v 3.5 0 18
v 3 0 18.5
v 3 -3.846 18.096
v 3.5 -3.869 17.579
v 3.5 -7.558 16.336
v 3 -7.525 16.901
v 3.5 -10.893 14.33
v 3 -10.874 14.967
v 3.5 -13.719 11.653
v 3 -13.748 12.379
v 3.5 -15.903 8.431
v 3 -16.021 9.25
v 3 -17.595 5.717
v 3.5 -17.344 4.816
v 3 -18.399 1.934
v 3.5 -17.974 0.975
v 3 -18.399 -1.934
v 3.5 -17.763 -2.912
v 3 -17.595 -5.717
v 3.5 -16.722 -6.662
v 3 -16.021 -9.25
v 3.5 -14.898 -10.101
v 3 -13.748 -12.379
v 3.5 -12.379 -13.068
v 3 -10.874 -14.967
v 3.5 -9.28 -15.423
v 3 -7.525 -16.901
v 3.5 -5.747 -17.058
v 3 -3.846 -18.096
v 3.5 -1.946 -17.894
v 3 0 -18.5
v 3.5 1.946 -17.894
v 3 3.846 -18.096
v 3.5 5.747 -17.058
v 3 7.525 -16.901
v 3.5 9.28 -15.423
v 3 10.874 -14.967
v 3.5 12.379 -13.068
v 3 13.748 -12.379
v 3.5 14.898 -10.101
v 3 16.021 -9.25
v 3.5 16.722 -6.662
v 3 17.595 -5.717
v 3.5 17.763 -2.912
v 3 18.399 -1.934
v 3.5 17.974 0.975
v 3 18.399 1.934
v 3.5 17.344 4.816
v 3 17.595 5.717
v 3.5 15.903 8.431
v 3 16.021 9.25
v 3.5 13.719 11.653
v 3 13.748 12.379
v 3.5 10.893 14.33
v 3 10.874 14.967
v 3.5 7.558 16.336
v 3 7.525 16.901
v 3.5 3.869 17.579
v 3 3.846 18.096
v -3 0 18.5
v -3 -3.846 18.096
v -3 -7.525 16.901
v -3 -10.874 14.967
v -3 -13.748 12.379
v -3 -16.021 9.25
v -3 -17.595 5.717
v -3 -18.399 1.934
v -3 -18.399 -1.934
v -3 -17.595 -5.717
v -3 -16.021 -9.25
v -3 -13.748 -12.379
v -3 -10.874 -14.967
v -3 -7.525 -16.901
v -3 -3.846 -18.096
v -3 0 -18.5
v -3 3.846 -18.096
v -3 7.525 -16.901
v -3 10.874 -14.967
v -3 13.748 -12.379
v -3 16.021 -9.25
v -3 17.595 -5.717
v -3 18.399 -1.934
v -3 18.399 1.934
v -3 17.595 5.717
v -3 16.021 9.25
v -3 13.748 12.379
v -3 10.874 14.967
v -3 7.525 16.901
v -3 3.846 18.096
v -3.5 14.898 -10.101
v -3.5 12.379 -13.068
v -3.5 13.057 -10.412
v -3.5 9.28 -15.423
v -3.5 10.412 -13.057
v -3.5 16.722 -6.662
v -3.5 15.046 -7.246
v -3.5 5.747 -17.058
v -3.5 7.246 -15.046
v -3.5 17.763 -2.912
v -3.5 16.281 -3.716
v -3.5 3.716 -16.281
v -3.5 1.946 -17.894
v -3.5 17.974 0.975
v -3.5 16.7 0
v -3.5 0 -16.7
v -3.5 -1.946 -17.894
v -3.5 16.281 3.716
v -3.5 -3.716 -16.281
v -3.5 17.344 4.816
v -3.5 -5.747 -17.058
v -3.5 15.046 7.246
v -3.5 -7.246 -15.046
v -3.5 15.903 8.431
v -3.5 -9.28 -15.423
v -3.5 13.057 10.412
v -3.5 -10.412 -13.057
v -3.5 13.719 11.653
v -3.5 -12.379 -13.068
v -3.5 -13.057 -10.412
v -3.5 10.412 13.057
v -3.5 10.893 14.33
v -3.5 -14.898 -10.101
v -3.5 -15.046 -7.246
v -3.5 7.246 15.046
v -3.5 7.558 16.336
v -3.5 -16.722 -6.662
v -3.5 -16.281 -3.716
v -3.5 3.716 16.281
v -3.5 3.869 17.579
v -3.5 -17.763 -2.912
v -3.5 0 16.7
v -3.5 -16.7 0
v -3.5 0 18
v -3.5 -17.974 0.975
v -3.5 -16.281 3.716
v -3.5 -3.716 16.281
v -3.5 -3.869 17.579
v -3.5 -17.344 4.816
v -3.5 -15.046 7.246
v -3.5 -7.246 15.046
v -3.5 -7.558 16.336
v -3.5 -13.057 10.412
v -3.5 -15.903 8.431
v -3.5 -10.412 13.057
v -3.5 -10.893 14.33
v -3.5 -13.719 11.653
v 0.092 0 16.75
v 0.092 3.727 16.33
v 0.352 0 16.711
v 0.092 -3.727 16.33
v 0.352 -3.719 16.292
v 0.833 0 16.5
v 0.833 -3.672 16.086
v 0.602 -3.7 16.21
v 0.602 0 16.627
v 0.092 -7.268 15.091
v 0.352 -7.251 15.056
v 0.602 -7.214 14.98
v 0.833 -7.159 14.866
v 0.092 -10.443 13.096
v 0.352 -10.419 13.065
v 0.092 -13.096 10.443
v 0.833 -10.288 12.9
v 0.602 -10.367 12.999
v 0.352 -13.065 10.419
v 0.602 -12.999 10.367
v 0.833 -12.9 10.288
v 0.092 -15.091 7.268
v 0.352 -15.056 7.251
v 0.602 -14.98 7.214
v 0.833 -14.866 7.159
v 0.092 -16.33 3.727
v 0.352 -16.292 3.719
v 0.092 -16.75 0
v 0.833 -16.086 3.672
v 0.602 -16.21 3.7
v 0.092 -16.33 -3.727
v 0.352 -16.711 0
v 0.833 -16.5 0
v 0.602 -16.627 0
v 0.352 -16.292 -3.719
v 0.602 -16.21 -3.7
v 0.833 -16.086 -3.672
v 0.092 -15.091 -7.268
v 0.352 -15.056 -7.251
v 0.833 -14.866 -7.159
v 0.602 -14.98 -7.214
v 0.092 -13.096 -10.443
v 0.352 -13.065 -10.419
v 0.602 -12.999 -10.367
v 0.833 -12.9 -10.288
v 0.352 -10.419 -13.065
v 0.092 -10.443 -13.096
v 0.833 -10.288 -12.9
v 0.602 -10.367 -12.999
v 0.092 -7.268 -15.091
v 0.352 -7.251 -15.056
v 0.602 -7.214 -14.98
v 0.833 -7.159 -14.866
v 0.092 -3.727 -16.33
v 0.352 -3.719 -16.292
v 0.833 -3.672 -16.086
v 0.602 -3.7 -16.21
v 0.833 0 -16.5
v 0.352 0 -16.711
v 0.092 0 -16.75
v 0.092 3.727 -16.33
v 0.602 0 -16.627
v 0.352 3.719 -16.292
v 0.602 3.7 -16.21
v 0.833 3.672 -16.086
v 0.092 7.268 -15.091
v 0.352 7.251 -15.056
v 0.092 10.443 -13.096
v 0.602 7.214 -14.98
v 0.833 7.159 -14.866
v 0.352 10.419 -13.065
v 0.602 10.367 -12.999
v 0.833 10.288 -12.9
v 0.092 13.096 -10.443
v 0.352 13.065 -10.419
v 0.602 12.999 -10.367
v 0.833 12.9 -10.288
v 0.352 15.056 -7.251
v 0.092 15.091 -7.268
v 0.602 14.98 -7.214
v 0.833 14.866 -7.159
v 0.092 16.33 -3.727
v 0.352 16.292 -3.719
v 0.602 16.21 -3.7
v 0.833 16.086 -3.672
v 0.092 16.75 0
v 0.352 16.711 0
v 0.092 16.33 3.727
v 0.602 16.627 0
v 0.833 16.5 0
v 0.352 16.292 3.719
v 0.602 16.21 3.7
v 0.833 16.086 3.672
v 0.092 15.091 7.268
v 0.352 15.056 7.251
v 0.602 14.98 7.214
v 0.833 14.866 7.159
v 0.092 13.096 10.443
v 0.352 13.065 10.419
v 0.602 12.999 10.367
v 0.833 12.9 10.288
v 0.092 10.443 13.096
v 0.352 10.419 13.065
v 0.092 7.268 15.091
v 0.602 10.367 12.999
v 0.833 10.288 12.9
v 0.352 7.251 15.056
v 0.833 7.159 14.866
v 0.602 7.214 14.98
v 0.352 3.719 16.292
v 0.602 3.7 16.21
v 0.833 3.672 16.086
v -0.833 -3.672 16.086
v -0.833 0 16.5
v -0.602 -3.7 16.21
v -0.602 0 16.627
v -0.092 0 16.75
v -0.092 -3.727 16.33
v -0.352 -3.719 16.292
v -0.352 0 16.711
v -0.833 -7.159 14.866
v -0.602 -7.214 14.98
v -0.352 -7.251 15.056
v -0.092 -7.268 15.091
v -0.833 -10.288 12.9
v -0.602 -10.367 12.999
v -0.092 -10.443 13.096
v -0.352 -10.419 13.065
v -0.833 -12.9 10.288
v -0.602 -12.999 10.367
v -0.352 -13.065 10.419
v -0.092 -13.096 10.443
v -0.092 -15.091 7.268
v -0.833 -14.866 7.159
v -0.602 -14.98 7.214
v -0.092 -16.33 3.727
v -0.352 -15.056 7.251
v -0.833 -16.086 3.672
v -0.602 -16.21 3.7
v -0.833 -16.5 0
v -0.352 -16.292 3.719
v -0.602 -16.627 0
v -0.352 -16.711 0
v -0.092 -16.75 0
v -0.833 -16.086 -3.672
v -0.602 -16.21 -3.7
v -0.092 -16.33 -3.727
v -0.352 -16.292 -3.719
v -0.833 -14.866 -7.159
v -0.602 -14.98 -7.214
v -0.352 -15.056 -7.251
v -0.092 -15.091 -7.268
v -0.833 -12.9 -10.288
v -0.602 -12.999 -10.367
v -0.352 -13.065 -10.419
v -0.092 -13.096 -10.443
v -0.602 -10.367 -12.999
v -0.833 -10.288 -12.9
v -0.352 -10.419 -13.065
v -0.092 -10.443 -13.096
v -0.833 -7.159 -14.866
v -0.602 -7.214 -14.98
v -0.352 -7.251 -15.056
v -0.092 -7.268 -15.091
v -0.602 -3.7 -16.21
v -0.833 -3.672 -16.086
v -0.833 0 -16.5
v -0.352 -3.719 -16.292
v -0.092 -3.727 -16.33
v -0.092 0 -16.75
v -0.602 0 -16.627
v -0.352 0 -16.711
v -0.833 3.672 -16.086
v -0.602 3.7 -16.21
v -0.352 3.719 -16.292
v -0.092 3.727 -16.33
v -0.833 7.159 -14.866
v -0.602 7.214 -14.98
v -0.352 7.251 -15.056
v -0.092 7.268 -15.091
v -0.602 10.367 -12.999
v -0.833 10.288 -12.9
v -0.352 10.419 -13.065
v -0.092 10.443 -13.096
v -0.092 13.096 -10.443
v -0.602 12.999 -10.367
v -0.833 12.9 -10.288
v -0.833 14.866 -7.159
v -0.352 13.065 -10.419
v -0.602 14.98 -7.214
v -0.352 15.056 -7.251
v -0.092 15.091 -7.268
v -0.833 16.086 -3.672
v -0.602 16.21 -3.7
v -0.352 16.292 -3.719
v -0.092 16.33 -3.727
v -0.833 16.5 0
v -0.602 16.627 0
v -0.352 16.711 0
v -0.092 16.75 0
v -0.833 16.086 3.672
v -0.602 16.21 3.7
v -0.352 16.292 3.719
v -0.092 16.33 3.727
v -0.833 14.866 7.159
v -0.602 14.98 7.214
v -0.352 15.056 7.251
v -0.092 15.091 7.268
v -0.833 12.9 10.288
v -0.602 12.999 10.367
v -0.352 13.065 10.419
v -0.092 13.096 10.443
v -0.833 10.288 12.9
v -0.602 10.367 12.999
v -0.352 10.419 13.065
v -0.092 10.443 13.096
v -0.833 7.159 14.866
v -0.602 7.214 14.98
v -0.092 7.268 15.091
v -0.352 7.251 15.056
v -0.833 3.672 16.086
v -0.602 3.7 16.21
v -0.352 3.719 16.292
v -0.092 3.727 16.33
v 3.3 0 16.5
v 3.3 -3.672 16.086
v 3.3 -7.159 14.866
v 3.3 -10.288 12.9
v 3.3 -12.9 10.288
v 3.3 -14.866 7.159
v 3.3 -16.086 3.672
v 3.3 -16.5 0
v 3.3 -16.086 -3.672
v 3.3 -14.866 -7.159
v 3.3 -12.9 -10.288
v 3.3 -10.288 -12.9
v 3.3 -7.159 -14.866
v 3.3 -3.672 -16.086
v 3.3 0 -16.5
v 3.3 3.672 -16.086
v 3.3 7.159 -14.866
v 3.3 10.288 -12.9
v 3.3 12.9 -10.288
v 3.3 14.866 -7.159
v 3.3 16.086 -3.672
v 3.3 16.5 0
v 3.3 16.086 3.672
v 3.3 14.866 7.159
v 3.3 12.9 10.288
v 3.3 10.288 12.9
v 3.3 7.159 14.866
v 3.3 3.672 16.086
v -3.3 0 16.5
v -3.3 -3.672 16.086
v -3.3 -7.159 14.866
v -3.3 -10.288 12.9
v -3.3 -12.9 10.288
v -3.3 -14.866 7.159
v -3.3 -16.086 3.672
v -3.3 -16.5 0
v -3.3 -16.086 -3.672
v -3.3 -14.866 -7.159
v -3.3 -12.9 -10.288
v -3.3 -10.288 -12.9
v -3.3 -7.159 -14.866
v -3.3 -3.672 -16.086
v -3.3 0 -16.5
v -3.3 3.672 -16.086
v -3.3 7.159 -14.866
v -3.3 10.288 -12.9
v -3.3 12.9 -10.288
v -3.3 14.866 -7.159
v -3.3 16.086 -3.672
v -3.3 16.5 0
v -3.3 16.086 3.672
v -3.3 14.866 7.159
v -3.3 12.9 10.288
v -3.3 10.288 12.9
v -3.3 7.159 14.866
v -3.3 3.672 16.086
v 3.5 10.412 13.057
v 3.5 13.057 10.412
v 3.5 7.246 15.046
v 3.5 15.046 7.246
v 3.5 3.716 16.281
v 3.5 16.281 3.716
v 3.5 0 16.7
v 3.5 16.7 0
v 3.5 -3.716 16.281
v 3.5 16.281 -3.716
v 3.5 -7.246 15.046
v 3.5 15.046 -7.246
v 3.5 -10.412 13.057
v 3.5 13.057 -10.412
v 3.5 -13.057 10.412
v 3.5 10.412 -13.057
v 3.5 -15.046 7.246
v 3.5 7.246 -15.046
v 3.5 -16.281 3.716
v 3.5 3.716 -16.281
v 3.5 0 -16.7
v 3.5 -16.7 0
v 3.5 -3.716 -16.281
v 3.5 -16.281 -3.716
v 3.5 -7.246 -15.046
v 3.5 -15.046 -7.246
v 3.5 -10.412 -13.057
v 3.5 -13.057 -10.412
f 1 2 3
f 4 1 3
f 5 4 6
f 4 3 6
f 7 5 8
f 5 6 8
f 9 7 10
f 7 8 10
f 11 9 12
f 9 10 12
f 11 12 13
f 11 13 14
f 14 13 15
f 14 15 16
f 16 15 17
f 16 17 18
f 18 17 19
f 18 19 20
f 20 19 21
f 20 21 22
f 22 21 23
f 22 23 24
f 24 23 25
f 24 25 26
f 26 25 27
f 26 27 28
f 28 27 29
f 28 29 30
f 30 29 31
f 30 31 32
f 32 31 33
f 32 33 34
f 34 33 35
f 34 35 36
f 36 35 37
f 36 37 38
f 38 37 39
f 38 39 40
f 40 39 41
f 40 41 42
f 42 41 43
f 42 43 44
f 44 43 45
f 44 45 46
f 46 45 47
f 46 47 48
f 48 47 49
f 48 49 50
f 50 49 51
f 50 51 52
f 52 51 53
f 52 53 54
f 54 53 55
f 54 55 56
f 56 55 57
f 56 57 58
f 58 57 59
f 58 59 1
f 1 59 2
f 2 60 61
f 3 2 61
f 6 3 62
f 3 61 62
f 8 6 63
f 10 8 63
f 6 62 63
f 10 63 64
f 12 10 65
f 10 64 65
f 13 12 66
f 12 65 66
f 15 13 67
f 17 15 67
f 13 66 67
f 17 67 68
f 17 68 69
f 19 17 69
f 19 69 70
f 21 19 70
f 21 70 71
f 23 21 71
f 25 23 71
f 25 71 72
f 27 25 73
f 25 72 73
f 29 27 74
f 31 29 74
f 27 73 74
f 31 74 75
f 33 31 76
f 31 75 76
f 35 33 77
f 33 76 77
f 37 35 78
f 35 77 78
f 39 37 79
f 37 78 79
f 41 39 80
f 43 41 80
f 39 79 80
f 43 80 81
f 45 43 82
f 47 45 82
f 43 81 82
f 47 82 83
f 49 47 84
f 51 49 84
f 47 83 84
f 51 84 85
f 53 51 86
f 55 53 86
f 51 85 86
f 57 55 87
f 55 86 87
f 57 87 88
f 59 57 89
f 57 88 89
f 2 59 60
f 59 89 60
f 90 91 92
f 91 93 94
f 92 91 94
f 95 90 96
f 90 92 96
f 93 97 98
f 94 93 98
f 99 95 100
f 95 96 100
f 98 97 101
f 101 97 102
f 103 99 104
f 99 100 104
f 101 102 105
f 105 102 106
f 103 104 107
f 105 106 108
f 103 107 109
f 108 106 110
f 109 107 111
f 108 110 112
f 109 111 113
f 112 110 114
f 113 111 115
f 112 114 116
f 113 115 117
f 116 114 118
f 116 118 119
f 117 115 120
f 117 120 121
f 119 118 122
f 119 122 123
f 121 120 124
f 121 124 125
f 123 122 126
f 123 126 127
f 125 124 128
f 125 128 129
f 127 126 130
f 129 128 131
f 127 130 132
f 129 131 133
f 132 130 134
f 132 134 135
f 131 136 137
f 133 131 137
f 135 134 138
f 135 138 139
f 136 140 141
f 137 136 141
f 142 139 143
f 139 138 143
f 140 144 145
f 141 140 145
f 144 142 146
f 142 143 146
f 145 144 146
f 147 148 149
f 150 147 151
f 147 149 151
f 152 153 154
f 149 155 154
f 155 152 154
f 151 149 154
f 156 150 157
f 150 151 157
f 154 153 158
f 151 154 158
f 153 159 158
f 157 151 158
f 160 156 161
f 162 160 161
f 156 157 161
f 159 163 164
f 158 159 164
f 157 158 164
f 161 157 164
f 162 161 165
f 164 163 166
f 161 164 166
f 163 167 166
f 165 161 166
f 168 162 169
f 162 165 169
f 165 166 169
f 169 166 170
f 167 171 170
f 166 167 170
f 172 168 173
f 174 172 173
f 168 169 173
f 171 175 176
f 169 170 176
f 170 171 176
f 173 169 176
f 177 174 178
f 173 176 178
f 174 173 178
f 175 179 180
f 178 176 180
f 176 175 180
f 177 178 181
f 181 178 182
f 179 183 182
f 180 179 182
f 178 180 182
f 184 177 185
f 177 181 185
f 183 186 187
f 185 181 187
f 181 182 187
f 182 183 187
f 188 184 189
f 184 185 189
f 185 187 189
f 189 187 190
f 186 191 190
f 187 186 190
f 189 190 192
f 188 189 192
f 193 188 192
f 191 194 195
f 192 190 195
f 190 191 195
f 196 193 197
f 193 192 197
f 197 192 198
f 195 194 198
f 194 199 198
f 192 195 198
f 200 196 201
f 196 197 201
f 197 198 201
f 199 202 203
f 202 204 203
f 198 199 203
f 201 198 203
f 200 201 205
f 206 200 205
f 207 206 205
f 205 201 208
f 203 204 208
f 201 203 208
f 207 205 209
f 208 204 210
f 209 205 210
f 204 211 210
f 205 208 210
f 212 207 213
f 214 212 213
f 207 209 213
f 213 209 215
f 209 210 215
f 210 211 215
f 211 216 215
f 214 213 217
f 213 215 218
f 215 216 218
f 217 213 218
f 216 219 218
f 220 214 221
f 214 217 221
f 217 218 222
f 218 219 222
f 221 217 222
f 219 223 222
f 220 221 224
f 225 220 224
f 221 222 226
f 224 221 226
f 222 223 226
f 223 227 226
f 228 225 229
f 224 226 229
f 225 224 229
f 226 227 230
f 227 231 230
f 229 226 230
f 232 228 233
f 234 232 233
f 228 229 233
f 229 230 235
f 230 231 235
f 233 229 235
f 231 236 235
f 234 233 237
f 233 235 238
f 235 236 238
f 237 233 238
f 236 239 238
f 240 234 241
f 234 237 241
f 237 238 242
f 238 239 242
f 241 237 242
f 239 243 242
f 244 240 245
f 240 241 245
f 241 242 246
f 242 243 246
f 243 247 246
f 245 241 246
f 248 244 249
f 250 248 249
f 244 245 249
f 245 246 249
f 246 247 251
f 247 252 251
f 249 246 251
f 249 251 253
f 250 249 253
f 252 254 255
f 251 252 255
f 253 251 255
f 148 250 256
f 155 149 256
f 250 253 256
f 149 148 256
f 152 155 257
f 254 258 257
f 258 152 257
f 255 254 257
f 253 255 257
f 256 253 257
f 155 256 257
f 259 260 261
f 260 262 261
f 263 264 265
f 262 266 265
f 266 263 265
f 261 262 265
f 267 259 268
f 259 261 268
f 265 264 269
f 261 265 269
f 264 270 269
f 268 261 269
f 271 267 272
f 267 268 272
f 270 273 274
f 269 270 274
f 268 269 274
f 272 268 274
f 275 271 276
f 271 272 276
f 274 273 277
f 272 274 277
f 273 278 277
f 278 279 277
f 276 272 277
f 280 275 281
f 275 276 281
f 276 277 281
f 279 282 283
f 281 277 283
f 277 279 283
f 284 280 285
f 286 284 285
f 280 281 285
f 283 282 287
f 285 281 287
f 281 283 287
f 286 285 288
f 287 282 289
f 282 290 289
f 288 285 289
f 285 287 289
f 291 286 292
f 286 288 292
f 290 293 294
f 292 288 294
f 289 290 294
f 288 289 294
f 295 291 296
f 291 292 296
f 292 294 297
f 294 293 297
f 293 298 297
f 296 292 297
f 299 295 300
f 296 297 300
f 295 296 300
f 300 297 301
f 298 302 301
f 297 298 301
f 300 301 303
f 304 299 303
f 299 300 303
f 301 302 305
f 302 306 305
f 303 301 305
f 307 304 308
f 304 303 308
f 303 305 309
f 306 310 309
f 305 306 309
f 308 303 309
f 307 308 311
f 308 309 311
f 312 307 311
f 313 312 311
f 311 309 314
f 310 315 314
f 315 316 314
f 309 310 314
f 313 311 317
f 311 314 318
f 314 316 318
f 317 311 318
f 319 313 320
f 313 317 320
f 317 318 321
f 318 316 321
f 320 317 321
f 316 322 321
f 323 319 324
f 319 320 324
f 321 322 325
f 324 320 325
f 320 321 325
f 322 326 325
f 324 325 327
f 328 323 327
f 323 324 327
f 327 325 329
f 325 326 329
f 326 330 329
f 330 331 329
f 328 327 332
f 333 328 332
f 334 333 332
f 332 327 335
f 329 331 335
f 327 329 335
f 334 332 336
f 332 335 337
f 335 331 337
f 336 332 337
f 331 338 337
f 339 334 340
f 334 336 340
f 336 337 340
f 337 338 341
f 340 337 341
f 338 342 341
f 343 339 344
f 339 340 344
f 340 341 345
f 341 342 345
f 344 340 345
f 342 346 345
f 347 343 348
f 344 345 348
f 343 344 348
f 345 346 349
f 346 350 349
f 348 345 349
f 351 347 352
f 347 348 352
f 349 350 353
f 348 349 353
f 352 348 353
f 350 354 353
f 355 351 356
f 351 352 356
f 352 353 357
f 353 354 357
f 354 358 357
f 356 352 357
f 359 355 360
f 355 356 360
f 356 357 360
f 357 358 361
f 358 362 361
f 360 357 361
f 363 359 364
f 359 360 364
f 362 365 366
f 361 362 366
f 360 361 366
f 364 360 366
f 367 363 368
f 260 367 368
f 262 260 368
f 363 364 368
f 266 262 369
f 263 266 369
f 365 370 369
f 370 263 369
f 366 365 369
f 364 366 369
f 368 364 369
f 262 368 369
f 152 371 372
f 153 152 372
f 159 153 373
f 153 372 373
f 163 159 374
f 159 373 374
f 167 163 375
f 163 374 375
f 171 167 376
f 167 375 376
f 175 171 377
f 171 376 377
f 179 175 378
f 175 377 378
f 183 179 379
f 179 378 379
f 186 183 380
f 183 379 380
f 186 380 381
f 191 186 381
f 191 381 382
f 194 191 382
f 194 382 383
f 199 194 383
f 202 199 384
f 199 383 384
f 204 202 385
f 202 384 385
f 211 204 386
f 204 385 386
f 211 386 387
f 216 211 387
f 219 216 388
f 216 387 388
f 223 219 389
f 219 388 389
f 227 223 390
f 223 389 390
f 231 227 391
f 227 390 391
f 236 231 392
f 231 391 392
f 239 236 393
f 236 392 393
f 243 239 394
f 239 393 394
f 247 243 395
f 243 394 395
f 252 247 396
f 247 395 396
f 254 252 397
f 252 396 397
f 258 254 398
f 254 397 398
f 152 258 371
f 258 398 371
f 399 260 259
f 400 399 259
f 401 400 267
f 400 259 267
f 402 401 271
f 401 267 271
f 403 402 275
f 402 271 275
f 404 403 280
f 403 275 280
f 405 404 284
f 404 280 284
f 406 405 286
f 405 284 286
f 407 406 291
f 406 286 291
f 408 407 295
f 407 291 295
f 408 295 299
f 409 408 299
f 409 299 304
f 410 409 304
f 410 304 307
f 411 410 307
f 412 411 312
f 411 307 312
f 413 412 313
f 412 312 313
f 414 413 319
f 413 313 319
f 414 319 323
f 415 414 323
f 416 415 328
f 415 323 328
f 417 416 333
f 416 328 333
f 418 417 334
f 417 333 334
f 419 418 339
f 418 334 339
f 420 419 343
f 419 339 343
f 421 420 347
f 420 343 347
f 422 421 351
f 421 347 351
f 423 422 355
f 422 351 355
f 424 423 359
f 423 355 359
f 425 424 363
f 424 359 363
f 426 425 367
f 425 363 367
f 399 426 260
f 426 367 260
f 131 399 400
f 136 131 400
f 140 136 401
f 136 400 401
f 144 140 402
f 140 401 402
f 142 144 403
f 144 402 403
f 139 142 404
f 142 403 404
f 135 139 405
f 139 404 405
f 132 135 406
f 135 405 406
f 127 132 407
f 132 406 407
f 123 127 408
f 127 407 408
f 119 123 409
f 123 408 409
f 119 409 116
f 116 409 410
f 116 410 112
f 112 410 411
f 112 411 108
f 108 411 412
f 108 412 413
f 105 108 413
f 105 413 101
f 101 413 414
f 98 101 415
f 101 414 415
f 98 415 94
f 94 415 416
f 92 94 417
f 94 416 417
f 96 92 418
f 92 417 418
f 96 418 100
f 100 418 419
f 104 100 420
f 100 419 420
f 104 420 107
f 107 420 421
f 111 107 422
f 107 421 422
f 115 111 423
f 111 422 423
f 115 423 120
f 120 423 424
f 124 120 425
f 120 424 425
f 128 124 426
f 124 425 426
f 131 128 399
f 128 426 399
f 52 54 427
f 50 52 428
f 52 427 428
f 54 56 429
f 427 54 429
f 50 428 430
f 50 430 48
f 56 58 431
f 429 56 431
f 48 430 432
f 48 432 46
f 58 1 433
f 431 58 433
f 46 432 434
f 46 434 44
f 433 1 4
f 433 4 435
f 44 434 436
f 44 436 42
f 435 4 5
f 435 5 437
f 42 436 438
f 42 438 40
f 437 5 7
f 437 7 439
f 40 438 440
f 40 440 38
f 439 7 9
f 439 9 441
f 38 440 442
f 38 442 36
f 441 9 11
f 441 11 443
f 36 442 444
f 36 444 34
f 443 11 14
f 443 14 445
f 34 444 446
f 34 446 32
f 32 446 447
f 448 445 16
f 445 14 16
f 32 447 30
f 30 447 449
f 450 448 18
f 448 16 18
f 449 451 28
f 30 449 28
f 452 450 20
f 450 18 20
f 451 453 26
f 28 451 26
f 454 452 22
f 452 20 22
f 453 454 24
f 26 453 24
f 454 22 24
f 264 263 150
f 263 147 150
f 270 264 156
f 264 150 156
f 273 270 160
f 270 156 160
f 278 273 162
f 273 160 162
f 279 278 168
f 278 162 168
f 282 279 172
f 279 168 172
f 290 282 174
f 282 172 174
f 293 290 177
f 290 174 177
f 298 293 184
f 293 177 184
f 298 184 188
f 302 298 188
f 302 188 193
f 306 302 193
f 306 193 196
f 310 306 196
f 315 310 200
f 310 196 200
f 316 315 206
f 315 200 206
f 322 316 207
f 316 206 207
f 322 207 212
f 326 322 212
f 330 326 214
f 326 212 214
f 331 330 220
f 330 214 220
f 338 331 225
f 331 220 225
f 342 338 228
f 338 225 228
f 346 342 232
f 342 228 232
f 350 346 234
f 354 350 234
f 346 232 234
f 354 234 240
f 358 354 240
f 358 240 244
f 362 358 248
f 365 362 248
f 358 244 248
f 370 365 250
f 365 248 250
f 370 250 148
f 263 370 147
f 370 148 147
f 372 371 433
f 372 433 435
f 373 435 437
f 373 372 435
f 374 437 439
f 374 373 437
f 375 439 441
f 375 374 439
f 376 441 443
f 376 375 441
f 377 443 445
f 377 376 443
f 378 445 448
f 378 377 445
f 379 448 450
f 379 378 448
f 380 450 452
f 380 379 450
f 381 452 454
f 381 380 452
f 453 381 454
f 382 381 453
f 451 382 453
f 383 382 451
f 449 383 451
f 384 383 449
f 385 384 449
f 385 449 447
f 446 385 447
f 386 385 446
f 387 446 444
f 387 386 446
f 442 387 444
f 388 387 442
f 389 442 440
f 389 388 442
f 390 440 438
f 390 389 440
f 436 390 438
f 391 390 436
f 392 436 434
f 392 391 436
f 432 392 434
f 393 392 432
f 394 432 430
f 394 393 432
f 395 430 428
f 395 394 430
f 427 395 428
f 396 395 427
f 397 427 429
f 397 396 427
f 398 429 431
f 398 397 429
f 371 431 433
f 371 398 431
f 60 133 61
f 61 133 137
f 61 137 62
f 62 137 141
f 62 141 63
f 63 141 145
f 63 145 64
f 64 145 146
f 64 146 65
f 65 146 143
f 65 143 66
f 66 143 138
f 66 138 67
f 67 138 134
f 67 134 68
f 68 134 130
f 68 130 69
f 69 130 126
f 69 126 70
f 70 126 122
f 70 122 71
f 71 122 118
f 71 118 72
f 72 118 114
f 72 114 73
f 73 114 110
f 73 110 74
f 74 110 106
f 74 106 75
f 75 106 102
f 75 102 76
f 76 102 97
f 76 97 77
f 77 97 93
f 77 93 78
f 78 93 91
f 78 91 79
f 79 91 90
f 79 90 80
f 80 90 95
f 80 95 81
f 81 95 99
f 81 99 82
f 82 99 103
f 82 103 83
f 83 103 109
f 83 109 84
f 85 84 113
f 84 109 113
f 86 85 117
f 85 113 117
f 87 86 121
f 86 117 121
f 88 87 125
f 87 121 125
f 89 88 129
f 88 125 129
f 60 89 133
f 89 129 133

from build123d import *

# Parameters (mm, degrees)
CHAMFER_1_SIZE = 0.5
CHAMFER_2_SIZE = 0.2


with BuildPart() as part:
    # Эскиз1 → Повернуть1 (revolve)
    with BuildSketch(Plane.XY, mode=Mode.PRIVATE) as revolve_1_sk:
        with BuildLine():
            Line((0.833368845, 16.5), (3.5, 16.5))
            Line((3.5, 16.5), (3.5, 18.5))
            Line((3.5, 18.5), (-3.5, 18.5))
            Line((-3.5, 18.5), (-3.5, 16.5))
            Line((-3.5, 16.5), (-0.833368845, 16.5))
            ThreePointArc((-0.833368845, 16.5), (-0.47911964, 16.67422796), (-0.091683865, 16.75))
            Line((-0.091683865, 16.75), (0.091683865, 16.75))
            ThreePointArc((0.091683865, 16.75), (0.47911964, 16.67422796), (0.833368845, 16.5))
        make_face()
    revolve(revolve_1_sk.sketch.rotate(Axis((0, 0, 0), (1, 0, 0)), 90), axis=Axis((0, 0, 0), (1, 0, 0)))

    # Фаска1
    chamfer_1_edges = [part.edges().sort_by_distance(p)[0] for p in [
        (-3.5, 0, -18.5),
        (3.5, 0, -18.5),
    ]]
    chamfer(chamfer_1_edges, length=CHAMFER_1_SIZE)

    # Фаска2
    chamfer_2_edges = [part.edges().sort_by_distance(p)[0] for p in [
        (3.5, 0, -16.5),
        (-3.5, 0, -16.5),
    ]]
    chamfer(chamfer_2_edges, length=CHAMFER_2_SIZE)


solid = part.part
